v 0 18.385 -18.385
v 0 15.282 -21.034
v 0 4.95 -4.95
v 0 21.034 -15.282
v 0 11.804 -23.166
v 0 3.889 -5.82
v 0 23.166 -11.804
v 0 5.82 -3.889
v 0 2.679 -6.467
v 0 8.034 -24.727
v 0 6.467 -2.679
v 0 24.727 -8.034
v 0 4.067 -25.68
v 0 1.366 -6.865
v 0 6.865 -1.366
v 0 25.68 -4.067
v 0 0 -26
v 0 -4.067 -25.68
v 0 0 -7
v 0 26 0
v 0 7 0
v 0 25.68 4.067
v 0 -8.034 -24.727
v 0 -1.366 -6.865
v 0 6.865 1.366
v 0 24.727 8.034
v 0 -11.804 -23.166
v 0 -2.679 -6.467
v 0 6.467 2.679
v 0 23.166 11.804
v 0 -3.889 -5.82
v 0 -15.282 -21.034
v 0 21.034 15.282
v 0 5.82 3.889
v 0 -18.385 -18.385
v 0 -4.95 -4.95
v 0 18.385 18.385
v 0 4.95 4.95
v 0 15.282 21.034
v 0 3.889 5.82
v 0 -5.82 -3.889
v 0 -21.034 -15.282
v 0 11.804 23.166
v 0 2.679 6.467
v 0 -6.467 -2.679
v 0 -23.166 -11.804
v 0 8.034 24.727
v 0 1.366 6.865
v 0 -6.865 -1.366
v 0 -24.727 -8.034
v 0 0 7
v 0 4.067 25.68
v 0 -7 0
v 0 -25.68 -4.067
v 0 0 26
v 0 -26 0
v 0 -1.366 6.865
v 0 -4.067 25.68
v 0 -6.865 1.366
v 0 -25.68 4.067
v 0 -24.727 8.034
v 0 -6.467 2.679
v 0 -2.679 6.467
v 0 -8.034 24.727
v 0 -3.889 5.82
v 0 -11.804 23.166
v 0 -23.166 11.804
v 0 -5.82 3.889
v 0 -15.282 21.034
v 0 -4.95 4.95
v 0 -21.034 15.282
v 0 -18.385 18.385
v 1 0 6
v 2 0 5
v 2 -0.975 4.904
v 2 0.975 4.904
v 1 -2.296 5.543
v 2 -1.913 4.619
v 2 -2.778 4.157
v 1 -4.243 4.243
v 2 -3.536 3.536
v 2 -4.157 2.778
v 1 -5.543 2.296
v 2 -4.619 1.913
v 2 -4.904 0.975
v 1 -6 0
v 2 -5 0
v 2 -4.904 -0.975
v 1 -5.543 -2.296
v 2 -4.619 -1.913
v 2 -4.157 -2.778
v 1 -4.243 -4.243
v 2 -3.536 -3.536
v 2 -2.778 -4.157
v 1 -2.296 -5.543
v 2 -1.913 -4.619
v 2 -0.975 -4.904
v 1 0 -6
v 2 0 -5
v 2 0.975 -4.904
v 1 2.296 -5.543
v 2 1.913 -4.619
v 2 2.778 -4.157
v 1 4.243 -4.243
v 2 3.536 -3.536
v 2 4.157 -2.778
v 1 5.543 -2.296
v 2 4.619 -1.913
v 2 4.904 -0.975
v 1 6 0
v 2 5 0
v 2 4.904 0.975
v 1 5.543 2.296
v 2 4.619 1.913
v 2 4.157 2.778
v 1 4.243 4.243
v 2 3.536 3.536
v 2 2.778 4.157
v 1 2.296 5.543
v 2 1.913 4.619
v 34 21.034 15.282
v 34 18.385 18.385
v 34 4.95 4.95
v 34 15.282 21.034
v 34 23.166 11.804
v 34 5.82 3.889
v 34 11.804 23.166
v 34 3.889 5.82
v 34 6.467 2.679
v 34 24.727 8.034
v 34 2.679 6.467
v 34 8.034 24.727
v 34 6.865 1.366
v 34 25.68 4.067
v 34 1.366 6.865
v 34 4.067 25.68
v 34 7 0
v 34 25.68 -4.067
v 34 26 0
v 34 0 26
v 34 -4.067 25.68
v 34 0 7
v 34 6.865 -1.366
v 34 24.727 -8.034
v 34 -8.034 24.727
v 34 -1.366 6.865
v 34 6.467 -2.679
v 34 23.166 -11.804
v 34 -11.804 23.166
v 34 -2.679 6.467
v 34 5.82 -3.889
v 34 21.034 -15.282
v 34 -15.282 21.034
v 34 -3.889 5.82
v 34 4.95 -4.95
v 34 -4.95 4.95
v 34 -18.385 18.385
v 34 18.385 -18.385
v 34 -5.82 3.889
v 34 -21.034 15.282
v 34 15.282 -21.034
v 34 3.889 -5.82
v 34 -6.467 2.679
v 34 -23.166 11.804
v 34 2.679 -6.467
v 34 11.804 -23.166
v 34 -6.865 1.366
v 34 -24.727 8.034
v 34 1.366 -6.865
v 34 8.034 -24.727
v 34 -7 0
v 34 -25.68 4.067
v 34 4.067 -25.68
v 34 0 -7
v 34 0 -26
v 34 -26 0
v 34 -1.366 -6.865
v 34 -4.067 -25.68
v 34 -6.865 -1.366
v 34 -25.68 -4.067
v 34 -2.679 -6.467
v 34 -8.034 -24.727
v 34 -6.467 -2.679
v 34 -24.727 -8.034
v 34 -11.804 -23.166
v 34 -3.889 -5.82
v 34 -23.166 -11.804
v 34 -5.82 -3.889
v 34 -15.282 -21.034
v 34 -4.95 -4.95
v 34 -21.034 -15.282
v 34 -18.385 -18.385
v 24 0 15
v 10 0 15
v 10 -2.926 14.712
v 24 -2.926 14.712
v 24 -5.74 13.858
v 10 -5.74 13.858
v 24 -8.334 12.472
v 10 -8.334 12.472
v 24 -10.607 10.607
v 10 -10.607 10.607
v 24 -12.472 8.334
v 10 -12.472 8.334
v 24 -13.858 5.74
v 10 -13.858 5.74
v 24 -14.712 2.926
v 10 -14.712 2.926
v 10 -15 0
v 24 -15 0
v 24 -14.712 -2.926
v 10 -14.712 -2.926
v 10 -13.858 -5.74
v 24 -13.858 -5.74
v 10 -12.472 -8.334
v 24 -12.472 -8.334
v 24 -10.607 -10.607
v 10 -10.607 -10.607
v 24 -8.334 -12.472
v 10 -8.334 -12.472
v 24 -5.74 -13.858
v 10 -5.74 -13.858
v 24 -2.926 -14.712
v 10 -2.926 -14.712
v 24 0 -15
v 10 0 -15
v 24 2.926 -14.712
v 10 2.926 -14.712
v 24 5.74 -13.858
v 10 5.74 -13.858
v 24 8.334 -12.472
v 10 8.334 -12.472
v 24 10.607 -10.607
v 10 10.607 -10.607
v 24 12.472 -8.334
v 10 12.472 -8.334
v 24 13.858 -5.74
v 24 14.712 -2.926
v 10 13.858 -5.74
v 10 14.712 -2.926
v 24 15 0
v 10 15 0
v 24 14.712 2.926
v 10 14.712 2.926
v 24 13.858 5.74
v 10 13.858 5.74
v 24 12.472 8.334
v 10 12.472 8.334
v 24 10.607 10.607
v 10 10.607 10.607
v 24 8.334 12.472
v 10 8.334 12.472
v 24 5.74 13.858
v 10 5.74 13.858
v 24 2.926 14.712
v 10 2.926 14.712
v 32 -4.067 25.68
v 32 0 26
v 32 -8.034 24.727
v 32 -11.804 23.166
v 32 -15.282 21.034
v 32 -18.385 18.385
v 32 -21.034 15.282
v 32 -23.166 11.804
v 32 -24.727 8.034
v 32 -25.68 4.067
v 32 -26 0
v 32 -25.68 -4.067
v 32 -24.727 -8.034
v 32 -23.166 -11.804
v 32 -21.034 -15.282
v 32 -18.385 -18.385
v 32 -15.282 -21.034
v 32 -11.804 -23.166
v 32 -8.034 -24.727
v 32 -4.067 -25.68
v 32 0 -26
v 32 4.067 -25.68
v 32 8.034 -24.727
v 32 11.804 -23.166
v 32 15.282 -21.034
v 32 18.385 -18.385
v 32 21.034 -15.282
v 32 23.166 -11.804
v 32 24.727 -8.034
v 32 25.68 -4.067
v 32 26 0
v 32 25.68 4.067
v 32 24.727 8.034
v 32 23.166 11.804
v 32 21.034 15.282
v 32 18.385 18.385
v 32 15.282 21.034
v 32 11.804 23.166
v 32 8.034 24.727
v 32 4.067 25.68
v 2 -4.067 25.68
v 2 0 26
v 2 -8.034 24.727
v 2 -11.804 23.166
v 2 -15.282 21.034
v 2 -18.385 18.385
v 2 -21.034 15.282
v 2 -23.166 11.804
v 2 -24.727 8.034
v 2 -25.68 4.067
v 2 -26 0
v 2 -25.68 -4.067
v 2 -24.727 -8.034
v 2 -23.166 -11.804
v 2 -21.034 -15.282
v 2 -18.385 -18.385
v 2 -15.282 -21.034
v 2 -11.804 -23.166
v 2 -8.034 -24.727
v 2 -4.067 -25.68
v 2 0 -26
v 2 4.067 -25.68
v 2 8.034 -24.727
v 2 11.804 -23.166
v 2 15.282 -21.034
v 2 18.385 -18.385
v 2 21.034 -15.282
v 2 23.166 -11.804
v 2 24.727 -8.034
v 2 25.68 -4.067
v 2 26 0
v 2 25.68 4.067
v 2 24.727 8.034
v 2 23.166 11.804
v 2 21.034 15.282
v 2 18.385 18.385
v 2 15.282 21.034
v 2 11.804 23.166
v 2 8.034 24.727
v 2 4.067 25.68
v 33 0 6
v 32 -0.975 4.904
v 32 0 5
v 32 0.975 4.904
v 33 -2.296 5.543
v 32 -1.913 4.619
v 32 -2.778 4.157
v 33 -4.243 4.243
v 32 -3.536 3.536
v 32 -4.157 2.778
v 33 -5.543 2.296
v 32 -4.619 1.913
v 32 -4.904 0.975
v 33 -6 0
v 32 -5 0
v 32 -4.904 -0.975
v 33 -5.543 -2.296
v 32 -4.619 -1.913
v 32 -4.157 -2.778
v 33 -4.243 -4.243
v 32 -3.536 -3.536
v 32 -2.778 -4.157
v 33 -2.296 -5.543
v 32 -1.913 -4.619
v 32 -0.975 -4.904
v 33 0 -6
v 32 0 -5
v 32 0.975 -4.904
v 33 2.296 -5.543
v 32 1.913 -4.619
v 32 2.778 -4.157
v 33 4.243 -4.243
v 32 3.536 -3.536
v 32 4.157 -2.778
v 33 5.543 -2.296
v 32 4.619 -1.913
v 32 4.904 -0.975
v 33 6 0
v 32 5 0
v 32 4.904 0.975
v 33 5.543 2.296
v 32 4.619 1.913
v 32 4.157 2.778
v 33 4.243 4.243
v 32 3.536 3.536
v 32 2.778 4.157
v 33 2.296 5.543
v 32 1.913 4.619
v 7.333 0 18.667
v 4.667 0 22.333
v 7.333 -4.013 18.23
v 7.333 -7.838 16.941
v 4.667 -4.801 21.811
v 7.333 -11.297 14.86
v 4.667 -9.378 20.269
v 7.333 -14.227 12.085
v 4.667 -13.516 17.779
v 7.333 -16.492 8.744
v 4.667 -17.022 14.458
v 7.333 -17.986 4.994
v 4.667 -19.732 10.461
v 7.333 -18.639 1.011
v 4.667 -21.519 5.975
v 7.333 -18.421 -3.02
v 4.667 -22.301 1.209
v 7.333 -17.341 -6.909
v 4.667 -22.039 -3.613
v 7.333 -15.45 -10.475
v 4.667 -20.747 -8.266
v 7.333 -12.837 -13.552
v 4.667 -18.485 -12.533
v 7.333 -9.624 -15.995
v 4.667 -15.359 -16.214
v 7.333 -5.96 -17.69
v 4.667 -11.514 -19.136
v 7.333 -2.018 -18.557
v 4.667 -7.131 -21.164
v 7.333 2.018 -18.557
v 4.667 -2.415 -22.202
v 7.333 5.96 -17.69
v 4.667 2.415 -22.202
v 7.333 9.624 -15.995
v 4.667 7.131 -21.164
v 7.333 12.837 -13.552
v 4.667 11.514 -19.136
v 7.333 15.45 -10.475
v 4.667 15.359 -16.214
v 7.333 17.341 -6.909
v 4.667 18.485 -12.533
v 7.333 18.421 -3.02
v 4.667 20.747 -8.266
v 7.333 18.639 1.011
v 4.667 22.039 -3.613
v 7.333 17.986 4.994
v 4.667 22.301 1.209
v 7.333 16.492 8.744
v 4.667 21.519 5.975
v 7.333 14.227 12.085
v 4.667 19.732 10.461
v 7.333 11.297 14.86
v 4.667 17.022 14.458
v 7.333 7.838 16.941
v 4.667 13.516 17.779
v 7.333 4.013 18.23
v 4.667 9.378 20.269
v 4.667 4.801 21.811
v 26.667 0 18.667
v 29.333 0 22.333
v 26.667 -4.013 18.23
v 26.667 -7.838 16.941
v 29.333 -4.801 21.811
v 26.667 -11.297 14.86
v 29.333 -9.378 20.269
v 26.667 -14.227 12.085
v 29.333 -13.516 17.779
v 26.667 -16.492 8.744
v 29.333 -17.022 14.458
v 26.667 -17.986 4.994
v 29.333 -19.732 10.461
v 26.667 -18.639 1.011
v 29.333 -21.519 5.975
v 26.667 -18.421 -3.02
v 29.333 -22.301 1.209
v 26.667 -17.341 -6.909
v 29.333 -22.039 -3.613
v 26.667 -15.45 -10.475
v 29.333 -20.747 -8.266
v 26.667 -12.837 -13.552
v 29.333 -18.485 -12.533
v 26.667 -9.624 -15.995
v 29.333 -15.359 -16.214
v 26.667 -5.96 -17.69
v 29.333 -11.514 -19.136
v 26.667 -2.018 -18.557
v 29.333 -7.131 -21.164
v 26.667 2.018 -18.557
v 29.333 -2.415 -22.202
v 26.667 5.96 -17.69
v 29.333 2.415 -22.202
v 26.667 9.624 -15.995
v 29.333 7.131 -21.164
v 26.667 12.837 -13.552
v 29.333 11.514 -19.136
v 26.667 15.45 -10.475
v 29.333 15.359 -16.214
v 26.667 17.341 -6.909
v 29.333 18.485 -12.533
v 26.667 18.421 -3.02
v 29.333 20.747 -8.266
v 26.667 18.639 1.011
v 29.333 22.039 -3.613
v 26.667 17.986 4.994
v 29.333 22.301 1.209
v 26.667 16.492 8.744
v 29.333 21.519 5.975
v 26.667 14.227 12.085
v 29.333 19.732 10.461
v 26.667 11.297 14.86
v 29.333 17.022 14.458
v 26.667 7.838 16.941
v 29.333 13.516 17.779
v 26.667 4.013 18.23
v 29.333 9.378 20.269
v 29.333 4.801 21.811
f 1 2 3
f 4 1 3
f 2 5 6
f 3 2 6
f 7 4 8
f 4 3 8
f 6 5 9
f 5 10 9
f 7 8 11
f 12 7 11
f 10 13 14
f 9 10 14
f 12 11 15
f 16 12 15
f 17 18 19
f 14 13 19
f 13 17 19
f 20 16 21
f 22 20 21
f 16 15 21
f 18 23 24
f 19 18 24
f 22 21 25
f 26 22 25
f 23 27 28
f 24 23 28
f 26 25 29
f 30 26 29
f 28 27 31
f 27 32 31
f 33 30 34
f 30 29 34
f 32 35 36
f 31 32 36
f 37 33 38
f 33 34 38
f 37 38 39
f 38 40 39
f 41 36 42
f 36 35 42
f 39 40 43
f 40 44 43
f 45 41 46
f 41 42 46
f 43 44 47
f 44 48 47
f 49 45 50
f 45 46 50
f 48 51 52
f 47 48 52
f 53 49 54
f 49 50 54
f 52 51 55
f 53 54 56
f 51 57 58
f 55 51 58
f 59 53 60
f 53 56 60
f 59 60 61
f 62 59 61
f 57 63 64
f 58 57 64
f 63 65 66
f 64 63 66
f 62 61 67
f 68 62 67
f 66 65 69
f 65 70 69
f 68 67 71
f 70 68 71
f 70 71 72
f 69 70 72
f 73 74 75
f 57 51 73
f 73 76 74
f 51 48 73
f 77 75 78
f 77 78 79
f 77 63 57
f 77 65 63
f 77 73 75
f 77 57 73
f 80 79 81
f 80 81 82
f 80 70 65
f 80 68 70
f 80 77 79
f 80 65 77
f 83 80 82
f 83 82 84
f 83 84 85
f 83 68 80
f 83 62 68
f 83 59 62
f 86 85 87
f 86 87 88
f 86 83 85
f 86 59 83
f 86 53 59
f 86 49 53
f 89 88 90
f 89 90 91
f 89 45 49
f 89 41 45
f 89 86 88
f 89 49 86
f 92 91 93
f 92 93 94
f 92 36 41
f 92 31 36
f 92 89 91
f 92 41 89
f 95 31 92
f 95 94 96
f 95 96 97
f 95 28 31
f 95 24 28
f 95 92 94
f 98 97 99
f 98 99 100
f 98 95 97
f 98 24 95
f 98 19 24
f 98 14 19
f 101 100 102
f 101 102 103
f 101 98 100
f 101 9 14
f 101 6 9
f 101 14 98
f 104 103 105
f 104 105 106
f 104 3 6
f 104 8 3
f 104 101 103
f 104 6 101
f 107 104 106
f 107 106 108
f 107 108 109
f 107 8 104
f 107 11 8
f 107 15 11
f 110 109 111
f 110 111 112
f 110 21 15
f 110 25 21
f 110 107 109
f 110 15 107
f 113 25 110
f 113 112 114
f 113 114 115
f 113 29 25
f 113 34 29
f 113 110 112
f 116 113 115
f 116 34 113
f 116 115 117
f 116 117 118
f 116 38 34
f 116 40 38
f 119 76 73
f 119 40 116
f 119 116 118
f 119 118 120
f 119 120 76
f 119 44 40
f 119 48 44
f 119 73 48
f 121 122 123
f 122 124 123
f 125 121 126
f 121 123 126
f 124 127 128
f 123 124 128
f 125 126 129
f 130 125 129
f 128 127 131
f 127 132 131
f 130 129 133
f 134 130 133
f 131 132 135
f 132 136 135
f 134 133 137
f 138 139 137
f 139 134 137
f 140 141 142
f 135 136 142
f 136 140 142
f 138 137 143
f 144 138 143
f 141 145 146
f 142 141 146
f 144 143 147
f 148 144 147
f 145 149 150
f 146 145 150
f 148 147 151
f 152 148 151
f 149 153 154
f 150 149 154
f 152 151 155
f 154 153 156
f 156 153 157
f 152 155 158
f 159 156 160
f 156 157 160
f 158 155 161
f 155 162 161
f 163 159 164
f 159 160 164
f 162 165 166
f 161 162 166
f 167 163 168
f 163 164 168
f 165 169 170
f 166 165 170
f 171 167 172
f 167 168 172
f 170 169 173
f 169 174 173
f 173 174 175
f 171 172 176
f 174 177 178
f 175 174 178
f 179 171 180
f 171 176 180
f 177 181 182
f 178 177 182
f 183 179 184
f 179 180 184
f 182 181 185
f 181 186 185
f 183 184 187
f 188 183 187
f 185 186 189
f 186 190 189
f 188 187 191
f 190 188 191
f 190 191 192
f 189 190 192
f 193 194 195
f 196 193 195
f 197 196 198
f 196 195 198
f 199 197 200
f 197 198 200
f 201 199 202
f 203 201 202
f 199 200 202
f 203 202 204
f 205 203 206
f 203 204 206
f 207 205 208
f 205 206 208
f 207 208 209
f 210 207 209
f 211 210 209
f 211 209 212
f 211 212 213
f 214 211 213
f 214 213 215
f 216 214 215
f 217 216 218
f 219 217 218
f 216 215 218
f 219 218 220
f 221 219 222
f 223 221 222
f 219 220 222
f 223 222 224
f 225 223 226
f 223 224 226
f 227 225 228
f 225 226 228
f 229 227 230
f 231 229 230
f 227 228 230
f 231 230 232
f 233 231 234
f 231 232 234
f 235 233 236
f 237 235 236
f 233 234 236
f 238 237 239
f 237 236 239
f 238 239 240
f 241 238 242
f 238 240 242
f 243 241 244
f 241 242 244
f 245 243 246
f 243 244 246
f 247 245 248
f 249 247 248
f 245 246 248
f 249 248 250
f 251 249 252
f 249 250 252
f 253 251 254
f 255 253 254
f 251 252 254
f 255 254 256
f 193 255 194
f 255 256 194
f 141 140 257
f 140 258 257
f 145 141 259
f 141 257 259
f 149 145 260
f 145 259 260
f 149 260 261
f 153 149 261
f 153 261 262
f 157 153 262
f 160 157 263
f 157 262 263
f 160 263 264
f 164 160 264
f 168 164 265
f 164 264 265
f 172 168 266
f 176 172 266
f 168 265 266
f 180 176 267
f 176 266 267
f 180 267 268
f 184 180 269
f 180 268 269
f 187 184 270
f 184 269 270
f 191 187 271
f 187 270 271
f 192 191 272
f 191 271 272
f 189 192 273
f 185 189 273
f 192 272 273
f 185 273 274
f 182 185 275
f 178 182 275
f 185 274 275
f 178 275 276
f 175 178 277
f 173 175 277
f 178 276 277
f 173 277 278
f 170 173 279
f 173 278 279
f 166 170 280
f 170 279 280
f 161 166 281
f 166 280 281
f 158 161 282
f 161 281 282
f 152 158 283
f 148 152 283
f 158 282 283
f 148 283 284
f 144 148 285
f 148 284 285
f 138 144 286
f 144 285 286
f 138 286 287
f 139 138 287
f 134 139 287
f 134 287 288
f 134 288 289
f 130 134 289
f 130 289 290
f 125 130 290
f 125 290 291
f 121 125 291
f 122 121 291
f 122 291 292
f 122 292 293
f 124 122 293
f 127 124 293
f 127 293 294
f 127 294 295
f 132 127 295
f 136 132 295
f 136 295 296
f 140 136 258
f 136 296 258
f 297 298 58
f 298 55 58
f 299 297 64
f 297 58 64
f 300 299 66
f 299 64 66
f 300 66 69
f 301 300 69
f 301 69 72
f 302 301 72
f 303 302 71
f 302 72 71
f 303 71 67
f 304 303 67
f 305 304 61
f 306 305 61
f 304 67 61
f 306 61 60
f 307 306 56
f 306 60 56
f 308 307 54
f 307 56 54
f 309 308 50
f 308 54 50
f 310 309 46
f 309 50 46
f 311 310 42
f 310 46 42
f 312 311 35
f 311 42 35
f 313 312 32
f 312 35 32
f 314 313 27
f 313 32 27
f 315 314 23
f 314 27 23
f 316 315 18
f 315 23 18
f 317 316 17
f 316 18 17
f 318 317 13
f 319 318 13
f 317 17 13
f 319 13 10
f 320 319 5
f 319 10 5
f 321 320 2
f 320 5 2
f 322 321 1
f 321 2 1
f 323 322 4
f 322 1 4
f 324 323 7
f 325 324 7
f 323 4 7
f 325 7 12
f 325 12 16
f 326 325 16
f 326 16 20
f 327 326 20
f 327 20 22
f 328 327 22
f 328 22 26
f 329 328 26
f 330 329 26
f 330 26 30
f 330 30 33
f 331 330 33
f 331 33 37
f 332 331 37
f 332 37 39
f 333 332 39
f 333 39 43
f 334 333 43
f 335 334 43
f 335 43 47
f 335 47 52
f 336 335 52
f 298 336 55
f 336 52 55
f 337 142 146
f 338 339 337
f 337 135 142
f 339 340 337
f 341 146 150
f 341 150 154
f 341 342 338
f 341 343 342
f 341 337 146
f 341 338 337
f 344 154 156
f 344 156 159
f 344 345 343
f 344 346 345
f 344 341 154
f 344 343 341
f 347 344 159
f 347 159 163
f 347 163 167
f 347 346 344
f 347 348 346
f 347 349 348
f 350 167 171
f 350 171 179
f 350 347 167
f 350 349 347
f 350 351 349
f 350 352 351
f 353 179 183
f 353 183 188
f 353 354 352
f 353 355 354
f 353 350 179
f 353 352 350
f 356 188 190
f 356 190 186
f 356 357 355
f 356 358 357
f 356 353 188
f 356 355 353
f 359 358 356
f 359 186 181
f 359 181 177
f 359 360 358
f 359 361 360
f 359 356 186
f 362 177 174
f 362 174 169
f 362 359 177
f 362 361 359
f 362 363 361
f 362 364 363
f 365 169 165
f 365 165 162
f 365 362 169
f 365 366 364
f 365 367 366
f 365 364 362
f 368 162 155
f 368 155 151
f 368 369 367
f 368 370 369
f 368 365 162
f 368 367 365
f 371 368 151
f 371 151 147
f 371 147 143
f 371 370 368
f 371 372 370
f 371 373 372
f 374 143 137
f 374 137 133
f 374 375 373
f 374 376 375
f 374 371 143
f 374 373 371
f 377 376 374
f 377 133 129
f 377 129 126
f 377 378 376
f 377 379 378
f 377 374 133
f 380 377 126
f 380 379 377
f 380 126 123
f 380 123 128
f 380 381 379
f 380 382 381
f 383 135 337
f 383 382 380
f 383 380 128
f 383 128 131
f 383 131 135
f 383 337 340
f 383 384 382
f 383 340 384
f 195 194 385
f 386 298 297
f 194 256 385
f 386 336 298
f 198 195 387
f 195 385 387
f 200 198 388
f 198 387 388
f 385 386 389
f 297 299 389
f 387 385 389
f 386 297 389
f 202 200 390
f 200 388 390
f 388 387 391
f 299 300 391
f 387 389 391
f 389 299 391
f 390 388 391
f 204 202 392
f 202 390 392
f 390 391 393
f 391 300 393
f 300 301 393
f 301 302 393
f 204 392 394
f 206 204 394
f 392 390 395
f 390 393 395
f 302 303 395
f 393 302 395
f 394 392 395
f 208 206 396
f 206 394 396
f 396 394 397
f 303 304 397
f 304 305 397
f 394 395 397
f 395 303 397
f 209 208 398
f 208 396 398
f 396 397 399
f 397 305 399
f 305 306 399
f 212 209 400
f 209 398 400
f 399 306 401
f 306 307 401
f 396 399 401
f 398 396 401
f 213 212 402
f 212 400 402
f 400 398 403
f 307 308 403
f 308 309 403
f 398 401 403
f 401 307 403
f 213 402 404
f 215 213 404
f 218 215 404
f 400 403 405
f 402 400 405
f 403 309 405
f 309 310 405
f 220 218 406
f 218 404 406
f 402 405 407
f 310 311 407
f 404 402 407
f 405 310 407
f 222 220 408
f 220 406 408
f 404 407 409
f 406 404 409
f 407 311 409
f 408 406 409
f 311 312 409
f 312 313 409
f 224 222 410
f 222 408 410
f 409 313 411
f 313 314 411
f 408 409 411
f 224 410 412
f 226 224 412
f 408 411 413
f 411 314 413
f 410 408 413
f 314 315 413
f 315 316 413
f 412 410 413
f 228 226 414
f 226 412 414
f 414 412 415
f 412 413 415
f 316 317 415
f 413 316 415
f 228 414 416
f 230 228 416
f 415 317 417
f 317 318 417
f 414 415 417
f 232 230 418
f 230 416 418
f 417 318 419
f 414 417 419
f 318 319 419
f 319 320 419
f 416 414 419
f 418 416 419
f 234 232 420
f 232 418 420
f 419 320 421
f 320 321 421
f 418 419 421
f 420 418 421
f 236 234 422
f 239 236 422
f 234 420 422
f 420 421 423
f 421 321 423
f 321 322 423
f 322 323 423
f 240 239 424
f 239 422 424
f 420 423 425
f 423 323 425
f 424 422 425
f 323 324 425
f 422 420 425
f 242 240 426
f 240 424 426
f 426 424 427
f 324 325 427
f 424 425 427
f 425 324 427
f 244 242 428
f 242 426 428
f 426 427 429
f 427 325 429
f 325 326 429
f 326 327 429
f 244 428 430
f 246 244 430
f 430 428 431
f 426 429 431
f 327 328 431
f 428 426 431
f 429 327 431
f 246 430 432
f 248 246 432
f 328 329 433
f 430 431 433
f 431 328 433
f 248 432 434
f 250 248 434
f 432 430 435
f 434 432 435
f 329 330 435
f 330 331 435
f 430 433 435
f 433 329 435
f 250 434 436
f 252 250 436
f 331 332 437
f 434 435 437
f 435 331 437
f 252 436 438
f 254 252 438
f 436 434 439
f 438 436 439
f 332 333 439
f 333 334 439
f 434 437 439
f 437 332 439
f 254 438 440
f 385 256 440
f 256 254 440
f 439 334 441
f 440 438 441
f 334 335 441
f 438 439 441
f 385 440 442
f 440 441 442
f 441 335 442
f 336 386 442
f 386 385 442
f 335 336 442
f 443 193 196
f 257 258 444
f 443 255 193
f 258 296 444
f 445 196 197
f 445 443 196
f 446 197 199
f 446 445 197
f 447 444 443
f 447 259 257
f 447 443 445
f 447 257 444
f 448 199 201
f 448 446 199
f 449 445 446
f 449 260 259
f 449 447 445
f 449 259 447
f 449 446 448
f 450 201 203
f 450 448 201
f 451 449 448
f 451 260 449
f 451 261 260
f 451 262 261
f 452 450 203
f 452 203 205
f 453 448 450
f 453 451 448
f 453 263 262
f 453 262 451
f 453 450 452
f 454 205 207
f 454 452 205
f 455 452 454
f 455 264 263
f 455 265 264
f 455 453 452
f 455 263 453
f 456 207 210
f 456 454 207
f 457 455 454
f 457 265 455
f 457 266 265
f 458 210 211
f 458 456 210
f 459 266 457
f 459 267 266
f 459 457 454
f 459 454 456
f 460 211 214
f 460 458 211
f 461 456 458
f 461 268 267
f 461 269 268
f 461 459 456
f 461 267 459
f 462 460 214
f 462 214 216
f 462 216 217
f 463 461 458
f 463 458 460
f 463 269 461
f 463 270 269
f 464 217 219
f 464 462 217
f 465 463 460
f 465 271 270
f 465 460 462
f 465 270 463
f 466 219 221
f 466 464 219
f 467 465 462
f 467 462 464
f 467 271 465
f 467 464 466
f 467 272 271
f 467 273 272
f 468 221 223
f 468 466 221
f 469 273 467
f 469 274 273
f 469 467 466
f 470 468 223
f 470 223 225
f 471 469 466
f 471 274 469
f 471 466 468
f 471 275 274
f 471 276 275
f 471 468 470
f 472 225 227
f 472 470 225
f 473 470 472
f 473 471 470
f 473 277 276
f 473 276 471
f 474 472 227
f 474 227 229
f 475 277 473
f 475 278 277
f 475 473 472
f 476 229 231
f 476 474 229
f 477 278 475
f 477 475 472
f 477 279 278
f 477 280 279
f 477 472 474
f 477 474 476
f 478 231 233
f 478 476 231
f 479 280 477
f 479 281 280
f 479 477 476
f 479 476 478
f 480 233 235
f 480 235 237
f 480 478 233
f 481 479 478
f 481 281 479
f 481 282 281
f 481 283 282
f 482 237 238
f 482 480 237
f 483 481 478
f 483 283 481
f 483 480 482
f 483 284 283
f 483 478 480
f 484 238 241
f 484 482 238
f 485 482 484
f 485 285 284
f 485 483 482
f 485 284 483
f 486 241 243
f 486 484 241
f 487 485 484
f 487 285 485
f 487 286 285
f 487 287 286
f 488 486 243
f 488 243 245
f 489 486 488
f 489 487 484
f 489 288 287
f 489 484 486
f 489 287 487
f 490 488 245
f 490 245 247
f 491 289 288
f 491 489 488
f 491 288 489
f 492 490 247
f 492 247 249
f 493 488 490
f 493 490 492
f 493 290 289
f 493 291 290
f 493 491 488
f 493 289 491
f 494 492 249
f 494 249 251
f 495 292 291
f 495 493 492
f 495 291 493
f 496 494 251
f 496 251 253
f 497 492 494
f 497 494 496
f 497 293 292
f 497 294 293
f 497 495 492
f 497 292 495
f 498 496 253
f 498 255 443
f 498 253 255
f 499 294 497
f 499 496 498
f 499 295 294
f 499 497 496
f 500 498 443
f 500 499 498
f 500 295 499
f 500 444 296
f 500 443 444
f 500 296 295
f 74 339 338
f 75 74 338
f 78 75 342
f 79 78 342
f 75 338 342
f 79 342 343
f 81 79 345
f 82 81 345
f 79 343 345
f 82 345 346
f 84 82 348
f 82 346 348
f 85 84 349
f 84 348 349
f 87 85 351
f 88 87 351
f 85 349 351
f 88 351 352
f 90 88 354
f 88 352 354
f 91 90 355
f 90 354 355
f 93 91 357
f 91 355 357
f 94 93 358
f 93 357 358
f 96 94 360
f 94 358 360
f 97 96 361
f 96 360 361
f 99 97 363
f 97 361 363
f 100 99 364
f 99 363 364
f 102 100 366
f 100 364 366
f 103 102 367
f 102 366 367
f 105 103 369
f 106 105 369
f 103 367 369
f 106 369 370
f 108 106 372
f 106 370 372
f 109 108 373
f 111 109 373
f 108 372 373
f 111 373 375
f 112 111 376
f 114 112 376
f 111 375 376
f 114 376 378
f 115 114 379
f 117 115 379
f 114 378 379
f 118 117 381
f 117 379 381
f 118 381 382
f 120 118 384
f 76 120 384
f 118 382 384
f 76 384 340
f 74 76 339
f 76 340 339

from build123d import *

# Parameters (mm, degrees)
F2_SIZE2 = 10.99999
F2_SIZE  = 7.99999
F3_SIZE  = 2


# Not quite as in the source:
# - a fillet or chamfer is up to 0.001 mm smaller than in the source, because OpenCascade refuses the exact size


with BuildPart() as f1:
    # F0 (on Front) → F1 (revolve)
    with BuildSketch(Plane.XZ):
        Polygon((0, 26), (0, 5), (34, 5), (34, 26), (32, 26), (32, 15), (2, 15), (2, 26), align=None)
    revolve(axis=Axis((17, 0, 0), (1, 0, 0)))

    # F2 (size 8 and 11 in the source; OpenCascade refuses exactly that, so slightly less here)
    f2_edges = [f1.edges().sort_by_distance(p)[0] for p in [
        (2, 0, -15),
        (32, 0, -15),
    ]]
    f2_side = f1.faces().sort_by_distance((17, 0, -15))[0]
    chamfer(f2_edges, length=F2_SIZE, length2=F2_SIZE2, reference=f2_side)

    # F3
    f3_edges = [f1.edges().sort_by_distance(p)[0] for p in [
        (0, 0, -5),
        (34, 0, -5),
    ]]
    chamfer(f3_edges, length=F3_SIZE)


solid = f1.part
